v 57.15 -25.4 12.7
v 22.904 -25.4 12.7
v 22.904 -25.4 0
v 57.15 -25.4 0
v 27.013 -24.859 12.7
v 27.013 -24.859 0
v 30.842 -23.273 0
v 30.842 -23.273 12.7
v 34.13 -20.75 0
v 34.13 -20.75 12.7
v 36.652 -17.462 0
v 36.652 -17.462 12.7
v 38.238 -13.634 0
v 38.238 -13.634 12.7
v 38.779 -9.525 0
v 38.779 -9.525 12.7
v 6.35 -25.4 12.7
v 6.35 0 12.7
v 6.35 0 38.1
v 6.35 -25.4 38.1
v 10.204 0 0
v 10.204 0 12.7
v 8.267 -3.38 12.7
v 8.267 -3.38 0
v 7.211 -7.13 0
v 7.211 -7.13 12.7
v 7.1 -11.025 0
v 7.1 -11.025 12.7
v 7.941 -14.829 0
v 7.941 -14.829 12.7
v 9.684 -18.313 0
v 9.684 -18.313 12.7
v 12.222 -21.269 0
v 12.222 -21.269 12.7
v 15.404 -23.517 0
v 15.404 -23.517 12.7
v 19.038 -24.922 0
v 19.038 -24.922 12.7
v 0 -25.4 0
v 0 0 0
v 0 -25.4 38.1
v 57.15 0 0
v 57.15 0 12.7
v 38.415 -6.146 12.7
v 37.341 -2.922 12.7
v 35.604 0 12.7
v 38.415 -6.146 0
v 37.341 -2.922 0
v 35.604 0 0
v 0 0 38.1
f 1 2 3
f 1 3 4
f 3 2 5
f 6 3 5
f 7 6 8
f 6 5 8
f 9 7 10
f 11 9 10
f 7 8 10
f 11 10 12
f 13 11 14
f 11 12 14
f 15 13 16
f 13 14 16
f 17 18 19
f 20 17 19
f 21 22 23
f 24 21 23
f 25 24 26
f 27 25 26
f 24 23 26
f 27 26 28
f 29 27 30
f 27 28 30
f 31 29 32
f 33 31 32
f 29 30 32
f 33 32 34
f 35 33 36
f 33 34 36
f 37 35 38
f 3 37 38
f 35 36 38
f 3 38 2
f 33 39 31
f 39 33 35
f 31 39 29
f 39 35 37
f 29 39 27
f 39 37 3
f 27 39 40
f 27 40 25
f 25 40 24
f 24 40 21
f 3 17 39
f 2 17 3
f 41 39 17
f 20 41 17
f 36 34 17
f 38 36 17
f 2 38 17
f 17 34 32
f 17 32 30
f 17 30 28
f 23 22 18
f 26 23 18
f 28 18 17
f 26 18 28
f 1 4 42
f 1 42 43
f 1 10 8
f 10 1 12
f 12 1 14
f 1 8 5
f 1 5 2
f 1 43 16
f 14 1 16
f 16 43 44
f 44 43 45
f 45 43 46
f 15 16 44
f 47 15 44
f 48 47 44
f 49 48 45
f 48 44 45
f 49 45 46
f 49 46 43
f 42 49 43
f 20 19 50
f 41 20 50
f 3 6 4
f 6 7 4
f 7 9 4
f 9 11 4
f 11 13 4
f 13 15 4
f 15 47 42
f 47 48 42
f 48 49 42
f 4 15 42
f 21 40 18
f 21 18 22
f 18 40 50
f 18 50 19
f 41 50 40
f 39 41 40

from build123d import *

# Parameters (mm, degrees)
F1_DEPTH = 25.4
F3_DEPTH = 25.4


with BuildPart() as f1:
    # F0 (on Front) → F1 (new body)
    with BuildSketch(Plane.XZ):
        Polygon((0, 38.1), (0, 0), (57.15, 0), (57.15, 12.7), (6.35, 12.7), (6.35, 38.1), align=None)
    extrude(amount=F1_DEPTH)

    # F2 (on face) → F3 (cut)
    with BuildSketch(Plane.XY.offset(12.7)):
        with BuildLine():
            ThreePointArc((22.904217, -25.4), (34.129537, -20.75032), (38.779217, -9.525))
            ThreePointArc((38.779217, -9.525), (37.964565, -4.504884), (35.604217, 0))
            Line((35.604217, 0), (10.204217, 0))
            ThreePointArc((10.204217, 0), (8.705186, -16.624516), (22.904217, -25.4))
        make_face()
    extrude(amount=-F3_DEPTH, mode=Mode.SUBTRACT)


solid = f1.part
